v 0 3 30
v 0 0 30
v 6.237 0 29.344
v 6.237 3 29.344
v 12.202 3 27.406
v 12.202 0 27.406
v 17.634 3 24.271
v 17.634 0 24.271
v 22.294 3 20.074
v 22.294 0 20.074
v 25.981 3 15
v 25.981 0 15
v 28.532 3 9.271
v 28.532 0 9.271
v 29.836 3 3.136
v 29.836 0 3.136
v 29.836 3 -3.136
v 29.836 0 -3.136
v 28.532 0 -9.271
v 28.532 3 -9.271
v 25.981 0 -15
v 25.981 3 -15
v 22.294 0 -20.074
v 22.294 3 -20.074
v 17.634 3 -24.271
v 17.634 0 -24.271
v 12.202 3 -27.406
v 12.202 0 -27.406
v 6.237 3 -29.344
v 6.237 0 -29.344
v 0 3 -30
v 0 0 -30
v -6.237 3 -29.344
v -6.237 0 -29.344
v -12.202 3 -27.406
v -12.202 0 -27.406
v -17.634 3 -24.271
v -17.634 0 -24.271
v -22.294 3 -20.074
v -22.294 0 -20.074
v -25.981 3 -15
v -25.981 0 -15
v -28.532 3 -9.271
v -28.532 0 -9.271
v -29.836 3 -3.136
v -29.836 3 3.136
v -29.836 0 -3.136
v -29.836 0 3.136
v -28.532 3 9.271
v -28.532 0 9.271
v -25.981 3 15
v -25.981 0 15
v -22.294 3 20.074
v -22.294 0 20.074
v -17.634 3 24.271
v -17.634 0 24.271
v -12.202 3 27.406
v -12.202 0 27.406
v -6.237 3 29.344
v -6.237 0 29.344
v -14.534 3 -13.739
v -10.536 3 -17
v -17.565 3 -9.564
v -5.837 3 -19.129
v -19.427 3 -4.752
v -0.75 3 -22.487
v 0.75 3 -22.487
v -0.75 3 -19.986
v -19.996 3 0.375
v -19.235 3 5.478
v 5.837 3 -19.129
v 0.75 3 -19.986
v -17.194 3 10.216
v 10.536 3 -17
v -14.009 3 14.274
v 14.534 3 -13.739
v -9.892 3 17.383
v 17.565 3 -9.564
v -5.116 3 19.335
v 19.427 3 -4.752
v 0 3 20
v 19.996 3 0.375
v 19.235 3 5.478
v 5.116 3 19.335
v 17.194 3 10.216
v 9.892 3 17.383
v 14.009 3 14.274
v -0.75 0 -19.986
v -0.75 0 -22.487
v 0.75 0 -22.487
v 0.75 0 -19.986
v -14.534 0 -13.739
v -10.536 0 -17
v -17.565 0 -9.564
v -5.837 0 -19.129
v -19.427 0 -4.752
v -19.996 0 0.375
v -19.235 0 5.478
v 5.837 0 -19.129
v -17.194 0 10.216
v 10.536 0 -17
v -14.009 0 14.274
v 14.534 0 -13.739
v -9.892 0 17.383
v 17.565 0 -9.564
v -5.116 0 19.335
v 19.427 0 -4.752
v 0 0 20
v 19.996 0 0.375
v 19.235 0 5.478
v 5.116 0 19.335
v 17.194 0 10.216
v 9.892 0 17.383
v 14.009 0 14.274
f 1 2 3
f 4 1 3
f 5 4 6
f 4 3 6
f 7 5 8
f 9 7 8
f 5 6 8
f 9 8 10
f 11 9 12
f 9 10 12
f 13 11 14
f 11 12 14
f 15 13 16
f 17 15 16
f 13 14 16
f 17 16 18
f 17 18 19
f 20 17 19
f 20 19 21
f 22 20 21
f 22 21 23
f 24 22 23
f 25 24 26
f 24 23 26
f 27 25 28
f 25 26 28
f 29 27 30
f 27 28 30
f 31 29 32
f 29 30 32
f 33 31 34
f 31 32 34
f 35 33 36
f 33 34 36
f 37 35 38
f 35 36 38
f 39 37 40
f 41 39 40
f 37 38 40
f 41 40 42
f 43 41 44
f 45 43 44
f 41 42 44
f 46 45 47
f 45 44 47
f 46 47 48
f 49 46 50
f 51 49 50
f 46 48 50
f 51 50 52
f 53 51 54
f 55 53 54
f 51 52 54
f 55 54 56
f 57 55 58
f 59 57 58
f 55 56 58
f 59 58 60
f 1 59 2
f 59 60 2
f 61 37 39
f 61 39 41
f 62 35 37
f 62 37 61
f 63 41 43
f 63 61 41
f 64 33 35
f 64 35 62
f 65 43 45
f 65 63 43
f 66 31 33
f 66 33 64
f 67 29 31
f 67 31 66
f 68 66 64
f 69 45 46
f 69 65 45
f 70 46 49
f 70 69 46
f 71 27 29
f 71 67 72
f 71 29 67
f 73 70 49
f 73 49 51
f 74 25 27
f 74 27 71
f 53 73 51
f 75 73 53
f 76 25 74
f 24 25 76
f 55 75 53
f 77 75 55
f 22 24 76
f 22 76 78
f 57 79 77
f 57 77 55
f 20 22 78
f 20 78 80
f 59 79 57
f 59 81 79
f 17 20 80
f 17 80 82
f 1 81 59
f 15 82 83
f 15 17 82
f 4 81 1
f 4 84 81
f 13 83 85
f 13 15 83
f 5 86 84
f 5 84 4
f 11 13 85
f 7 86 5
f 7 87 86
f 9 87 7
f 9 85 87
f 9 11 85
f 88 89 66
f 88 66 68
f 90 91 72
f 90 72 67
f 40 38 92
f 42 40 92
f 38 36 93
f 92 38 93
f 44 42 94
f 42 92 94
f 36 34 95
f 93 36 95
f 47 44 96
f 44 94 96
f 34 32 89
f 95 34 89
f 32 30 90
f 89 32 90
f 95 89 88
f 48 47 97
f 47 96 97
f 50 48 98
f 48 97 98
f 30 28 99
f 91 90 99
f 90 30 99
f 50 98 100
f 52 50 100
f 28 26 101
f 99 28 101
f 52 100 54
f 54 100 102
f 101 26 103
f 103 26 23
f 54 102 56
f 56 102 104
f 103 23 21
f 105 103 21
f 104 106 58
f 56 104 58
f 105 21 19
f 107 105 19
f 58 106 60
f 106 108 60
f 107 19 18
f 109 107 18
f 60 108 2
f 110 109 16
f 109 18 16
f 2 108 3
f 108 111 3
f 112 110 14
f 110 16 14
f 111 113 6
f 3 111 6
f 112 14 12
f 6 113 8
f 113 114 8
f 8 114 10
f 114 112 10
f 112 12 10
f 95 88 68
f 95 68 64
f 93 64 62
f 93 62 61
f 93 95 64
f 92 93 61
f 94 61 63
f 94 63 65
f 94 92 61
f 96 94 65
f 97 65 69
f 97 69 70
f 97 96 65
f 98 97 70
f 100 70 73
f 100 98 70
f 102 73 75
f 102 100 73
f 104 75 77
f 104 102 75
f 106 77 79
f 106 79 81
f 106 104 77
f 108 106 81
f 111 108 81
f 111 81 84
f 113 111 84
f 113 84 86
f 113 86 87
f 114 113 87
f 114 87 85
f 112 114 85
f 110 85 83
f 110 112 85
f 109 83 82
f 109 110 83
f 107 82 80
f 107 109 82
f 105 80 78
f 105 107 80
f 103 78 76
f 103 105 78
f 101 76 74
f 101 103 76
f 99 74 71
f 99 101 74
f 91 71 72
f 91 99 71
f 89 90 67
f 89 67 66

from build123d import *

# Parameters (mm, degrees)
ESQUISSE1_R        = 30
BOSS_EXTRU_1_DEPTH = 3


with BuildPart() as part:
    # Esquisse1 → Boss.-Extru.1 (new body)
    with BuildSketch(Plane(origin=(0, 0, 0), x_dir=(1, 0, 0), z_dir=(0, 1, 0))):
        with Locations(Location((0, 0, 0), (0, 0, 270))):
            Circle(ESQUISSE1_R)
        with BuildLine():
            Line((0.75, 22.487496526), (-0.75, 22.487496526))
            Line((-0.75, 22.487496526), (-0.75, 19.985932553))
            ThreePointArc((-0.75, 19.985932553), (0, -20), (0.75, 19.985932553))
            Line((0.75, 19.985932553), (0.75, 22.487496526))
        make_face(mode=Mode.SUBTRACT)
    extrude(amount=BOSS_EXTRU_1_DEPTH)


solid = part.part
